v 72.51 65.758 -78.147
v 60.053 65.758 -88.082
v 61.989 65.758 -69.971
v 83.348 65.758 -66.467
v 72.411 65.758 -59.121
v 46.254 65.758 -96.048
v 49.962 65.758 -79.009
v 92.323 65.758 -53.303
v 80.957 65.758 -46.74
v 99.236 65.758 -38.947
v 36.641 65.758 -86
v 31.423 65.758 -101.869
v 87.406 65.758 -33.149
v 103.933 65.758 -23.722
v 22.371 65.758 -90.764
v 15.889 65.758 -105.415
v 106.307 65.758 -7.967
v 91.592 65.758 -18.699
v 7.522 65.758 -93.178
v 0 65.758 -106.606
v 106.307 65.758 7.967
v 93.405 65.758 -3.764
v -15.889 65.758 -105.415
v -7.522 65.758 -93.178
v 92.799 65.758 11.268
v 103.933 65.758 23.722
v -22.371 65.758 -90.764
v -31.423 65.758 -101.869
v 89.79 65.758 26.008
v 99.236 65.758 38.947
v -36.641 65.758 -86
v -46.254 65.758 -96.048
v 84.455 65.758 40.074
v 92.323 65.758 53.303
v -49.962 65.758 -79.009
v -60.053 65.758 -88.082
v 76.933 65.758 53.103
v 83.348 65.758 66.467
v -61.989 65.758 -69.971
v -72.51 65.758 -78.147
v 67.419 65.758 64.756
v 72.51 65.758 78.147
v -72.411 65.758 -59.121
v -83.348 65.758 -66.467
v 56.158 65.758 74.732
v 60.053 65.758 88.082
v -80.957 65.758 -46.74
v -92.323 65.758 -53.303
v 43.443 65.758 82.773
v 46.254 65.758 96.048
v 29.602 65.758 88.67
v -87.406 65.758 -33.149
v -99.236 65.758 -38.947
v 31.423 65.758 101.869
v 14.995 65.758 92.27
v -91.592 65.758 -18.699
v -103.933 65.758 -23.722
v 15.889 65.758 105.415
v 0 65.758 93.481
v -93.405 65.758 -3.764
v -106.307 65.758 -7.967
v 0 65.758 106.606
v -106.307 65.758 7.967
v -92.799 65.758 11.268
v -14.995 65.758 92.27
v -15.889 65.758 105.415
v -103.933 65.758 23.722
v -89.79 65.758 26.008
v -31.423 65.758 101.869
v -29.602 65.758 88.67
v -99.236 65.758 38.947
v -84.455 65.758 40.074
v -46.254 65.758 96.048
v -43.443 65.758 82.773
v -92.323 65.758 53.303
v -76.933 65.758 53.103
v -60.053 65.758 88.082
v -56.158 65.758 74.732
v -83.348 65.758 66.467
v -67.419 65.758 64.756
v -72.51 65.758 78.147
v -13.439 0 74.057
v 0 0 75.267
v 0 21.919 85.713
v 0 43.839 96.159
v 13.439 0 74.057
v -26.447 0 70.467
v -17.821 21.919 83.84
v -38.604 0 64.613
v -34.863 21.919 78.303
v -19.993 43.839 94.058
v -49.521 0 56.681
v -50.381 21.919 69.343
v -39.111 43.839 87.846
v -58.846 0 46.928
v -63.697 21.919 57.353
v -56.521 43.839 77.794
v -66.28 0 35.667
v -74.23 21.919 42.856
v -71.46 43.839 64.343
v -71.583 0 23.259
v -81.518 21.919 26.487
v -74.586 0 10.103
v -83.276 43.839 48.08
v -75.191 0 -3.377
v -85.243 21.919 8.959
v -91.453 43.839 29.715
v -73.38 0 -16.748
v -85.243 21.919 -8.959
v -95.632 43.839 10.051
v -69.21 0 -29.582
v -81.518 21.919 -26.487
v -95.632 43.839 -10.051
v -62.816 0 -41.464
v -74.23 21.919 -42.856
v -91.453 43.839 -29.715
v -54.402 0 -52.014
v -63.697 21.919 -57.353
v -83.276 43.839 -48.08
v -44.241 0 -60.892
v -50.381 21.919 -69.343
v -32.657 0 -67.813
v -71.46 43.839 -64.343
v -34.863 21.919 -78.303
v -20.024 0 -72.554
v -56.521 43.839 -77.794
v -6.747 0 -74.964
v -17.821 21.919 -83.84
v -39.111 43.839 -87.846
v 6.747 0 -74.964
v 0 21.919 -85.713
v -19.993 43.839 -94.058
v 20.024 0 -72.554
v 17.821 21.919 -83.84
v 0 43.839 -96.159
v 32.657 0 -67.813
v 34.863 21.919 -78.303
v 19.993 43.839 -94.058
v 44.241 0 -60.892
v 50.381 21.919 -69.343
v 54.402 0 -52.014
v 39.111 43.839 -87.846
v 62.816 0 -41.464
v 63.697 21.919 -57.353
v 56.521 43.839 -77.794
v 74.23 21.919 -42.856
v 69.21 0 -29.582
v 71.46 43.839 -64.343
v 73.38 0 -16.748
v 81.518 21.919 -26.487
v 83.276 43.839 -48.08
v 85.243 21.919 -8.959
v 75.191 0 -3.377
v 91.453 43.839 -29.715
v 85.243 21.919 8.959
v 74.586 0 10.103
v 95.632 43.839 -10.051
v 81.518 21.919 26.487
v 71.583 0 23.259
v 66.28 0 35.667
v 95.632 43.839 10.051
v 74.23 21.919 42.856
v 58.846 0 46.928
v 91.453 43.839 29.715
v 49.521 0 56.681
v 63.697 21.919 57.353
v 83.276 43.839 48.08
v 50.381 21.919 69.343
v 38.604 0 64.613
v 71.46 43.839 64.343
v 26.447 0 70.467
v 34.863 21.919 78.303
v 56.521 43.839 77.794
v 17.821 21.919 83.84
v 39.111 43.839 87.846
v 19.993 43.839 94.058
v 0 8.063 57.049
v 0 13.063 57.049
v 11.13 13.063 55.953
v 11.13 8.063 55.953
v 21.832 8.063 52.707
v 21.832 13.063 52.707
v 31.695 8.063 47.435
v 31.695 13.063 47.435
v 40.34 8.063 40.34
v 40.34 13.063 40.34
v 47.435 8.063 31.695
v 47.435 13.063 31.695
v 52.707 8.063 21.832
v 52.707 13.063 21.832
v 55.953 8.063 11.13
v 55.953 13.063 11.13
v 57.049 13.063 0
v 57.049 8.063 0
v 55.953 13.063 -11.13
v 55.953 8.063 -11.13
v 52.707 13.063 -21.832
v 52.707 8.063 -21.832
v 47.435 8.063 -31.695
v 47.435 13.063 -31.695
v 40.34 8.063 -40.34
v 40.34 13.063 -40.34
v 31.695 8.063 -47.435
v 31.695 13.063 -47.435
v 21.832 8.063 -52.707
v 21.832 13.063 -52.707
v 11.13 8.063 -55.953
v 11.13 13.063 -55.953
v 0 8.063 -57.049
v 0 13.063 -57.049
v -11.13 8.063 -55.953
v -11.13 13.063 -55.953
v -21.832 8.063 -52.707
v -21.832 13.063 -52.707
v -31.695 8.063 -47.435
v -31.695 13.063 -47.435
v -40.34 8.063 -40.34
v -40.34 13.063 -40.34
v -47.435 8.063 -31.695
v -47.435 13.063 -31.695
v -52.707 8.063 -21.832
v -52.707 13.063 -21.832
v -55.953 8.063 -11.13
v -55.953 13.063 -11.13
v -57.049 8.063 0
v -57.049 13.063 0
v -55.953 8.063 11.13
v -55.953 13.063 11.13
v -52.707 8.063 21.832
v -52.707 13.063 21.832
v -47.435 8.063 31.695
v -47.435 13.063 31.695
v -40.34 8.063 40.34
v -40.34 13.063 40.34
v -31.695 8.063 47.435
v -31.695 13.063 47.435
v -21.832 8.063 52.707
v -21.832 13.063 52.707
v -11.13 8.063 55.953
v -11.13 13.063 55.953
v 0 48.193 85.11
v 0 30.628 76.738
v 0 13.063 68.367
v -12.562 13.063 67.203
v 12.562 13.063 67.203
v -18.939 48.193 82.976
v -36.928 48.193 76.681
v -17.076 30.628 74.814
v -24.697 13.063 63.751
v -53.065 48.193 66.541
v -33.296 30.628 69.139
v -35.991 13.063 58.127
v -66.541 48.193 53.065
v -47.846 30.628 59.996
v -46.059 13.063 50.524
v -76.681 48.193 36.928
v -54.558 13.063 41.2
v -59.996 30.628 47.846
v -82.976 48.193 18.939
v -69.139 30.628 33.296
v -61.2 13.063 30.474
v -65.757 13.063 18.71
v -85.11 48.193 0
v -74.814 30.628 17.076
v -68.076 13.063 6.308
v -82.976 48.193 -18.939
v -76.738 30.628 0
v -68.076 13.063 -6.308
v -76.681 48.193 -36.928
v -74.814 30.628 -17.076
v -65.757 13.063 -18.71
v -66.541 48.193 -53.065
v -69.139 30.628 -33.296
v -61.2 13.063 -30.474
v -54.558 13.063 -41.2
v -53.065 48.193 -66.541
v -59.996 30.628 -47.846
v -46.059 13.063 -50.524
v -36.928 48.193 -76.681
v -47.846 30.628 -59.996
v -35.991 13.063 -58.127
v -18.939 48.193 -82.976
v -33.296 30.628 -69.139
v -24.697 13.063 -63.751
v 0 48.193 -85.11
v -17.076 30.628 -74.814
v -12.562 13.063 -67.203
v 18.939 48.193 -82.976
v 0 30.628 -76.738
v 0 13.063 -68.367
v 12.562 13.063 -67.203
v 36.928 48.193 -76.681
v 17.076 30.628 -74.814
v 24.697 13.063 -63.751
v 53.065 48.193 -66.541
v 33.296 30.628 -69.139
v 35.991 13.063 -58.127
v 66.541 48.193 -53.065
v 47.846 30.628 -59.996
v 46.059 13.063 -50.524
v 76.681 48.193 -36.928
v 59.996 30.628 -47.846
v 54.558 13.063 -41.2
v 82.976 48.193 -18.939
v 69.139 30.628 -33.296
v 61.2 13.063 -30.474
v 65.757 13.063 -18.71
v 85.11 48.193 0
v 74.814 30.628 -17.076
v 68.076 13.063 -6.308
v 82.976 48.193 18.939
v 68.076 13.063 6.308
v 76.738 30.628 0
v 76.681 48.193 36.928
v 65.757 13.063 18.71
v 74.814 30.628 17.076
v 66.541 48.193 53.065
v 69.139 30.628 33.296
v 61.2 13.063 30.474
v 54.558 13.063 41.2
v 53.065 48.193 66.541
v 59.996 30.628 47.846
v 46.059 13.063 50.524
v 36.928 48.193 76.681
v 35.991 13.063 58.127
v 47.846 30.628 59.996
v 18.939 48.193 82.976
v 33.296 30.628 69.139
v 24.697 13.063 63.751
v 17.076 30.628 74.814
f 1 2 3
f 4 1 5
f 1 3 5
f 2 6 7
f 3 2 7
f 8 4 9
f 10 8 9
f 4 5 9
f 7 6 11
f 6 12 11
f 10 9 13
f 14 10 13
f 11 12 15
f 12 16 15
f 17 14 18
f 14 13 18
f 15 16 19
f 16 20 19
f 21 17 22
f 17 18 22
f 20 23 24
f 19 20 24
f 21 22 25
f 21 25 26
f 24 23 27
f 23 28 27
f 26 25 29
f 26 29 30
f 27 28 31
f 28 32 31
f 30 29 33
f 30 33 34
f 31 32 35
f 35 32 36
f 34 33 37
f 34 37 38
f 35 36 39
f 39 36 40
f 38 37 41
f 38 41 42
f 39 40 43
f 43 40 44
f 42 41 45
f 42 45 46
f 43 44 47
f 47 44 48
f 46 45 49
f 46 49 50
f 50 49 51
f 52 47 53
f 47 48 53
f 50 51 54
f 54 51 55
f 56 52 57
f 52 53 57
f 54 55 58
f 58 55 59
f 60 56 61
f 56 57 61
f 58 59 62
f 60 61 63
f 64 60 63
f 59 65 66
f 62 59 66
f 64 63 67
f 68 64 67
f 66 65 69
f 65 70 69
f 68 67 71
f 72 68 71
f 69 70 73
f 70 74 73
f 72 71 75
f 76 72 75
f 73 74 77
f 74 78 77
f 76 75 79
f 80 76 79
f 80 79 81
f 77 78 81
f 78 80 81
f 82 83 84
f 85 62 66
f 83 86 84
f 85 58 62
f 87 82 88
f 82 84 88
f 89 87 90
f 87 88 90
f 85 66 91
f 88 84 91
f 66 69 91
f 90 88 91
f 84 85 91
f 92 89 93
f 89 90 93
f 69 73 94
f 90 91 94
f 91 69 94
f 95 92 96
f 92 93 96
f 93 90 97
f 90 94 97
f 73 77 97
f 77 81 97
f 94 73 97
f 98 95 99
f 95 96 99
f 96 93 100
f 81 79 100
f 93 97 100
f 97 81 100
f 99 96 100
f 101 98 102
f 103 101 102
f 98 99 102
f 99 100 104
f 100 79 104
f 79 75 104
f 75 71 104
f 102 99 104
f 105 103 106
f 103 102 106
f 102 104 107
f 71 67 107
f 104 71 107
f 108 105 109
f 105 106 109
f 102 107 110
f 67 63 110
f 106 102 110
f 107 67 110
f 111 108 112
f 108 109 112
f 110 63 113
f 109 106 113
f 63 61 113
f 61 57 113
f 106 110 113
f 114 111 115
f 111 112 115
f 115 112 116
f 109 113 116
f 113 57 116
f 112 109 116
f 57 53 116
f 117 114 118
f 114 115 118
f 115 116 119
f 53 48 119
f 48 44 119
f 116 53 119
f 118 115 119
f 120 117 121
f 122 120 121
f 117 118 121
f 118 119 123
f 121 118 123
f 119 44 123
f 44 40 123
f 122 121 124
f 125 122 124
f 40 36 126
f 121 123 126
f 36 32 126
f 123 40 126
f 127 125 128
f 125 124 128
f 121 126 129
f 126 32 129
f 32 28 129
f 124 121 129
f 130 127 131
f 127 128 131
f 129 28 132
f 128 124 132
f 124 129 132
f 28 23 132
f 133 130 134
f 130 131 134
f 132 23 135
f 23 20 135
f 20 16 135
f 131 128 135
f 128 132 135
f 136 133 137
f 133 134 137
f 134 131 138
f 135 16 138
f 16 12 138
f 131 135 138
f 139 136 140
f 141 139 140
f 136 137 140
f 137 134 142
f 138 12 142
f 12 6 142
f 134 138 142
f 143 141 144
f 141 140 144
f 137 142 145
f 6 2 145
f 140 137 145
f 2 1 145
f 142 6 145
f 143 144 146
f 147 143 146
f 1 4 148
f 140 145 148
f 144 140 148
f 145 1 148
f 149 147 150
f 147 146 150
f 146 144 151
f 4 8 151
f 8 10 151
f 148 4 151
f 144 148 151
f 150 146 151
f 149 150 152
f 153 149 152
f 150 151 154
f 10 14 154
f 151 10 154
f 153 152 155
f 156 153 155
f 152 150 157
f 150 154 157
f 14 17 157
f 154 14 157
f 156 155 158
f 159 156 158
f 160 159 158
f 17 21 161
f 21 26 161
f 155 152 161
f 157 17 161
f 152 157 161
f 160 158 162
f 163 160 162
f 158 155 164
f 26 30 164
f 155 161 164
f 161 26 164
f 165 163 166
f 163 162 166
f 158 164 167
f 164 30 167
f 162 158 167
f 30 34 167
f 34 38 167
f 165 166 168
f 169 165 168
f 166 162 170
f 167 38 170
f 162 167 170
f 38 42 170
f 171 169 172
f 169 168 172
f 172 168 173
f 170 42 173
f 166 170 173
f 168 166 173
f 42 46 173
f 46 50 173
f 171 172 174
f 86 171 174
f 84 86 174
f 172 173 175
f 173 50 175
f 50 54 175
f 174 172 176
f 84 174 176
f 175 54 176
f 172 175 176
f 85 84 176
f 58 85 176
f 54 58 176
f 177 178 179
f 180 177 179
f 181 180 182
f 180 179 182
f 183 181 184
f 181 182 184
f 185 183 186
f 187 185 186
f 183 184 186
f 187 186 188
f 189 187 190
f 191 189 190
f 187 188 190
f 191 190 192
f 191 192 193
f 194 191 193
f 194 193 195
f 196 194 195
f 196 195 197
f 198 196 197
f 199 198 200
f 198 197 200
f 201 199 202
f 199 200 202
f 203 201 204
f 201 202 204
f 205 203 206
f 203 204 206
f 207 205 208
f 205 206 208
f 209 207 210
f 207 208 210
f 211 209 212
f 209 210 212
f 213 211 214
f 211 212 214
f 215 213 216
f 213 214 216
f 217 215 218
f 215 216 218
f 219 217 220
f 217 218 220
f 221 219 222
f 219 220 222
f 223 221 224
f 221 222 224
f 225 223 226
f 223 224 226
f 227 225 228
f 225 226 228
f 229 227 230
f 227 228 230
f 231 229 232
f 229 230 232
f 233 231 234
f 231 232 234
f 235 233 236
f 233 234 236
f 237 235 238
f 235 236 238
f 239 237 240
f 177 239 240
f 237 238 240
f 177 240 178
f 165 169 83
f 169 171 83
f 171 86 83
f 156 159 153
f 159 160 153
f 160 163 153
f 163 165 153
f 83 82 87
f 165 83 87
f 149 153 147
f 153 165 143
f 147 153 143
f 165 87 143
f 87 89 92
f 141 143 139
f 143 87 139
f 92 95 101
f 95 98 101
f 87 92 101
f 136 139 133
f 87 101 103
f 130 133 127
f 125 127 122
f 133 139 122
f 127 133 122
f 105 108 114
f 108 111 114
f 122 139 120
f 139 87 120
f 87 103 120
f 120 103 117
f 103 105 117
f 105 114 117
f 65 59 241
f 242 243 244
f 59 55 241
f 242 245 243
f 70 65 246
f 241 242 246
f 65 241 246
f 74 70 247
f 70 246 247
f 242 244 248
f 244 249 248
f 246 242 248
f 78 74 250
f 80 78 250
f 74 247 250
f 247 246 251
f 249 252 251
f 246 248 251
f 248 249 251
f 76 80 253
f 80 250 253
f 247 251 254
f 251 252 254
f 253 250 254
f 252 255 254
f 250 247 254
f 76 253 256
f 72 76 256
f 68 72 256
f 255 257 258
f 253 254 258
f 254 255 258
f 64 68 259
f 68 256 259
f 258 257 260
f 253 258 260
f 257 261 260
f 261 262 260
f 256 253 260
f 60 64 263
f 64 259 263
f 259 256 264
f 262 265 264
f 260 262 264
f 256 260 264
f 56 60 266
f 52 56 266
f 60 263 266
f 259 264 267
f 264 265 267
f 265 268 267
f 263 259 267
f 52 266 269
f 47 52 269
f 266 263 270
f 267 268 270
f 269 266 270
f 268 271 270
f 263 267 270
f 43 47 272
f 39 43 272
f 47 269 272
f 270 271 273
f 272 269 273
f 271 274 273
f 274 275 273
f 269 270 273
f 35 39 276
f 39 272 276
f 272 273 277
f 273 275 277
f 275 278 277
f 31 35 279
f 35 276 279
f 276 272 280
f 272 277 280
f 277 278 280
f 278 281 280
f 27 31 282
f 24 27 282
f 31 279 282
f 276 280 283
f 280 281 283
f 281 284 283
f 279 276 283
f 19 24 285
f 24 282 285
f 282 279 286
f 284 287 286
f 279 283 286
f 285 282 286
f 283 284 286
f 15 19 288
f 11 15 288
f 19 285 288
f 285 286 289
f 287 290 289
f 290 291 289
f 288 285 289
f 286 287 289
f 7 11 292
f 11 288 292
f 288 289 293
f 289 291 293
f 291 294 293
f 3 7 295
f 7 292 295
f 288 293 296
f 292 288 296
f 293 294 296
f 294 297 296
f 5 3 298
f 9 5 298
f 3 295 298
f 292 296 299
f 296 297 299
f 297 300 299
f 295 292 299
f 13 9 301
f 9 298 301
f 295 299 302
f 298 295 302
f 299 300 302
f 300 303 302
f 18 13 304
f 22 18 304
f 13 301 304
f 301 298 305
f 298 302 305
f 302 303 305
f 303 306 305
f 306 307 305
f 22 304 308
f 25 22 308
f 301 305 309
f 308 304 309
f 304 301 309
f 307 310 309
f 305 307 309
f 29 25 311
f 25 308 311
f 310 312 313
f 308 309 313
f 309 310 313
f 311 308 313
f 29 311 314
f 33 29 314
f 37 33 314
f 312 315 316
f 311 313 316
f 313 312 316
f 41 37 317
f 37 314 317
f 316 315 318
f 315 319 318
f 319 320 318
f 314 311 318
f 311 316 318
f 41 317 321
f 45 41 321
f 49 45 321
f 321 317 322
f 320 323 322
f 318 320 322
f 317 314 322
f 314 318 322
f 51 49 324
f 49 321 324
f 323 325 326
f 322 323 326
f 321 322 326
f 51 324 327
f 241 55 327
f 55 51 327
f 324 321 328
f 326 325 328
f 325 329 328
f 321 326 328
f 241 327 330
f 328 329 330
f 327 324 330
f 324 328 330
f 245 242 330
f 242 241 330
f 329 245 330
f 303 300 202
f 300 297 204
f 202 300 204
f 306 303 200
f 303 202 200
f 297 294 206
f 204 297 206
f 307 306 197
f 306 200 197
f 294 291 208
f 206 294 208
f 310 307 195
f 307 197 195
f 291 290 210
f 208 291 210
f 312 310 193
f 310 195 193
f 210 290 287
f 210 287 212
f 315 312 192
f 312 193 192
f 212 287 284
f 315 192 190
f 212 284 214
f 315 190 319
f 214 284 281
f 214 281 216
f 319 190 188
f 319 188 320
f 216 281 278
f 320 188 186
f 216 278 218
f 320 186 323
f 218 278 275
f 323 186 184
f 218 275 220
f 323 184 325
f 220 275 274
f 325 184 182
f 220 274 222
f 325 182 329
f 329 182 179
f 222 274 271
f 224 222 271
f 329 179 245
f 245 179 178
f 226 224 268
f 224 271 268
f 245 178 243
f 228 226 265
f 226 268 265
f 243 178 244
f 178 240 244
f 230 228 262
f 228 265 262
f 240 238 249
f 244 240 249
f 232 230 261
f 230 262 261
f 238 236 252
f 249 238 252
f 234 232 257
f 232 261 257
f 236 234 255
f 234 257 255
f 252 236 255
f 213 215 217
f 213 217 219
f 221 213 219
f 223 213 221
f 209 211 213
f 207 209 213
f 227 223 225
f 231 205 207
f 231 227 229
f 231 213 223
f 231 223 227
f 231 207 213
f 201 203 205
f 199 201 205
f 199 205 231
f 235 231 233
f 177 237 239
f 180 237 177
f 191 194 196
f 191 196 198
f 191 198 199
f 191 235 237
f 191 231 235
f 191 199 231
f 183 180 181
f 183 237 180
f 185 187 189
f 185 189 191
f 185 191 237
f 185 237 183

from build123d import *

# Parameters (mm, degrees)
SKETCH2_R          = 57.049339495
CUT_EXTRUDE1_DEPTH = 5


with BuildPart() as part:
    # Sketch1 → Revolve1 (revolve)
    with BuildSketch(Plane.XY, mode=Mode.PRIVATE) as revolve1_sk:
        Polygon((0, 0), (75.266699621, 0), (106.605503378, 65.757917285), (93.480705223, 65.757917285), (68.367246776, 13.062583534), (0, 13.062583534), align=None)
    revolve(revolve1_sk.sketch.rotate(Axis((0, 73.257801944, 0), (0, -1, 0)), 90), axis=Axis((0, 73.257801944, 0), (0, -1, 0)))

    # Sketch2 → Cut-Extrude1 (cut)
    with BuildSketch(Plane(origin=(0, 13.062583534, 0), x_dir=(1, 0, 0), z_dir=(0, 1, 0))):
        with Locations(Location((0, 0, 0), (0, 0, 270))):
            Circle(SKETCH2_R)
    extrude(amount=-CUT_EXTRUDE1_DEPTH, mode=Mode.SUBTRACT)


solid = part.part
